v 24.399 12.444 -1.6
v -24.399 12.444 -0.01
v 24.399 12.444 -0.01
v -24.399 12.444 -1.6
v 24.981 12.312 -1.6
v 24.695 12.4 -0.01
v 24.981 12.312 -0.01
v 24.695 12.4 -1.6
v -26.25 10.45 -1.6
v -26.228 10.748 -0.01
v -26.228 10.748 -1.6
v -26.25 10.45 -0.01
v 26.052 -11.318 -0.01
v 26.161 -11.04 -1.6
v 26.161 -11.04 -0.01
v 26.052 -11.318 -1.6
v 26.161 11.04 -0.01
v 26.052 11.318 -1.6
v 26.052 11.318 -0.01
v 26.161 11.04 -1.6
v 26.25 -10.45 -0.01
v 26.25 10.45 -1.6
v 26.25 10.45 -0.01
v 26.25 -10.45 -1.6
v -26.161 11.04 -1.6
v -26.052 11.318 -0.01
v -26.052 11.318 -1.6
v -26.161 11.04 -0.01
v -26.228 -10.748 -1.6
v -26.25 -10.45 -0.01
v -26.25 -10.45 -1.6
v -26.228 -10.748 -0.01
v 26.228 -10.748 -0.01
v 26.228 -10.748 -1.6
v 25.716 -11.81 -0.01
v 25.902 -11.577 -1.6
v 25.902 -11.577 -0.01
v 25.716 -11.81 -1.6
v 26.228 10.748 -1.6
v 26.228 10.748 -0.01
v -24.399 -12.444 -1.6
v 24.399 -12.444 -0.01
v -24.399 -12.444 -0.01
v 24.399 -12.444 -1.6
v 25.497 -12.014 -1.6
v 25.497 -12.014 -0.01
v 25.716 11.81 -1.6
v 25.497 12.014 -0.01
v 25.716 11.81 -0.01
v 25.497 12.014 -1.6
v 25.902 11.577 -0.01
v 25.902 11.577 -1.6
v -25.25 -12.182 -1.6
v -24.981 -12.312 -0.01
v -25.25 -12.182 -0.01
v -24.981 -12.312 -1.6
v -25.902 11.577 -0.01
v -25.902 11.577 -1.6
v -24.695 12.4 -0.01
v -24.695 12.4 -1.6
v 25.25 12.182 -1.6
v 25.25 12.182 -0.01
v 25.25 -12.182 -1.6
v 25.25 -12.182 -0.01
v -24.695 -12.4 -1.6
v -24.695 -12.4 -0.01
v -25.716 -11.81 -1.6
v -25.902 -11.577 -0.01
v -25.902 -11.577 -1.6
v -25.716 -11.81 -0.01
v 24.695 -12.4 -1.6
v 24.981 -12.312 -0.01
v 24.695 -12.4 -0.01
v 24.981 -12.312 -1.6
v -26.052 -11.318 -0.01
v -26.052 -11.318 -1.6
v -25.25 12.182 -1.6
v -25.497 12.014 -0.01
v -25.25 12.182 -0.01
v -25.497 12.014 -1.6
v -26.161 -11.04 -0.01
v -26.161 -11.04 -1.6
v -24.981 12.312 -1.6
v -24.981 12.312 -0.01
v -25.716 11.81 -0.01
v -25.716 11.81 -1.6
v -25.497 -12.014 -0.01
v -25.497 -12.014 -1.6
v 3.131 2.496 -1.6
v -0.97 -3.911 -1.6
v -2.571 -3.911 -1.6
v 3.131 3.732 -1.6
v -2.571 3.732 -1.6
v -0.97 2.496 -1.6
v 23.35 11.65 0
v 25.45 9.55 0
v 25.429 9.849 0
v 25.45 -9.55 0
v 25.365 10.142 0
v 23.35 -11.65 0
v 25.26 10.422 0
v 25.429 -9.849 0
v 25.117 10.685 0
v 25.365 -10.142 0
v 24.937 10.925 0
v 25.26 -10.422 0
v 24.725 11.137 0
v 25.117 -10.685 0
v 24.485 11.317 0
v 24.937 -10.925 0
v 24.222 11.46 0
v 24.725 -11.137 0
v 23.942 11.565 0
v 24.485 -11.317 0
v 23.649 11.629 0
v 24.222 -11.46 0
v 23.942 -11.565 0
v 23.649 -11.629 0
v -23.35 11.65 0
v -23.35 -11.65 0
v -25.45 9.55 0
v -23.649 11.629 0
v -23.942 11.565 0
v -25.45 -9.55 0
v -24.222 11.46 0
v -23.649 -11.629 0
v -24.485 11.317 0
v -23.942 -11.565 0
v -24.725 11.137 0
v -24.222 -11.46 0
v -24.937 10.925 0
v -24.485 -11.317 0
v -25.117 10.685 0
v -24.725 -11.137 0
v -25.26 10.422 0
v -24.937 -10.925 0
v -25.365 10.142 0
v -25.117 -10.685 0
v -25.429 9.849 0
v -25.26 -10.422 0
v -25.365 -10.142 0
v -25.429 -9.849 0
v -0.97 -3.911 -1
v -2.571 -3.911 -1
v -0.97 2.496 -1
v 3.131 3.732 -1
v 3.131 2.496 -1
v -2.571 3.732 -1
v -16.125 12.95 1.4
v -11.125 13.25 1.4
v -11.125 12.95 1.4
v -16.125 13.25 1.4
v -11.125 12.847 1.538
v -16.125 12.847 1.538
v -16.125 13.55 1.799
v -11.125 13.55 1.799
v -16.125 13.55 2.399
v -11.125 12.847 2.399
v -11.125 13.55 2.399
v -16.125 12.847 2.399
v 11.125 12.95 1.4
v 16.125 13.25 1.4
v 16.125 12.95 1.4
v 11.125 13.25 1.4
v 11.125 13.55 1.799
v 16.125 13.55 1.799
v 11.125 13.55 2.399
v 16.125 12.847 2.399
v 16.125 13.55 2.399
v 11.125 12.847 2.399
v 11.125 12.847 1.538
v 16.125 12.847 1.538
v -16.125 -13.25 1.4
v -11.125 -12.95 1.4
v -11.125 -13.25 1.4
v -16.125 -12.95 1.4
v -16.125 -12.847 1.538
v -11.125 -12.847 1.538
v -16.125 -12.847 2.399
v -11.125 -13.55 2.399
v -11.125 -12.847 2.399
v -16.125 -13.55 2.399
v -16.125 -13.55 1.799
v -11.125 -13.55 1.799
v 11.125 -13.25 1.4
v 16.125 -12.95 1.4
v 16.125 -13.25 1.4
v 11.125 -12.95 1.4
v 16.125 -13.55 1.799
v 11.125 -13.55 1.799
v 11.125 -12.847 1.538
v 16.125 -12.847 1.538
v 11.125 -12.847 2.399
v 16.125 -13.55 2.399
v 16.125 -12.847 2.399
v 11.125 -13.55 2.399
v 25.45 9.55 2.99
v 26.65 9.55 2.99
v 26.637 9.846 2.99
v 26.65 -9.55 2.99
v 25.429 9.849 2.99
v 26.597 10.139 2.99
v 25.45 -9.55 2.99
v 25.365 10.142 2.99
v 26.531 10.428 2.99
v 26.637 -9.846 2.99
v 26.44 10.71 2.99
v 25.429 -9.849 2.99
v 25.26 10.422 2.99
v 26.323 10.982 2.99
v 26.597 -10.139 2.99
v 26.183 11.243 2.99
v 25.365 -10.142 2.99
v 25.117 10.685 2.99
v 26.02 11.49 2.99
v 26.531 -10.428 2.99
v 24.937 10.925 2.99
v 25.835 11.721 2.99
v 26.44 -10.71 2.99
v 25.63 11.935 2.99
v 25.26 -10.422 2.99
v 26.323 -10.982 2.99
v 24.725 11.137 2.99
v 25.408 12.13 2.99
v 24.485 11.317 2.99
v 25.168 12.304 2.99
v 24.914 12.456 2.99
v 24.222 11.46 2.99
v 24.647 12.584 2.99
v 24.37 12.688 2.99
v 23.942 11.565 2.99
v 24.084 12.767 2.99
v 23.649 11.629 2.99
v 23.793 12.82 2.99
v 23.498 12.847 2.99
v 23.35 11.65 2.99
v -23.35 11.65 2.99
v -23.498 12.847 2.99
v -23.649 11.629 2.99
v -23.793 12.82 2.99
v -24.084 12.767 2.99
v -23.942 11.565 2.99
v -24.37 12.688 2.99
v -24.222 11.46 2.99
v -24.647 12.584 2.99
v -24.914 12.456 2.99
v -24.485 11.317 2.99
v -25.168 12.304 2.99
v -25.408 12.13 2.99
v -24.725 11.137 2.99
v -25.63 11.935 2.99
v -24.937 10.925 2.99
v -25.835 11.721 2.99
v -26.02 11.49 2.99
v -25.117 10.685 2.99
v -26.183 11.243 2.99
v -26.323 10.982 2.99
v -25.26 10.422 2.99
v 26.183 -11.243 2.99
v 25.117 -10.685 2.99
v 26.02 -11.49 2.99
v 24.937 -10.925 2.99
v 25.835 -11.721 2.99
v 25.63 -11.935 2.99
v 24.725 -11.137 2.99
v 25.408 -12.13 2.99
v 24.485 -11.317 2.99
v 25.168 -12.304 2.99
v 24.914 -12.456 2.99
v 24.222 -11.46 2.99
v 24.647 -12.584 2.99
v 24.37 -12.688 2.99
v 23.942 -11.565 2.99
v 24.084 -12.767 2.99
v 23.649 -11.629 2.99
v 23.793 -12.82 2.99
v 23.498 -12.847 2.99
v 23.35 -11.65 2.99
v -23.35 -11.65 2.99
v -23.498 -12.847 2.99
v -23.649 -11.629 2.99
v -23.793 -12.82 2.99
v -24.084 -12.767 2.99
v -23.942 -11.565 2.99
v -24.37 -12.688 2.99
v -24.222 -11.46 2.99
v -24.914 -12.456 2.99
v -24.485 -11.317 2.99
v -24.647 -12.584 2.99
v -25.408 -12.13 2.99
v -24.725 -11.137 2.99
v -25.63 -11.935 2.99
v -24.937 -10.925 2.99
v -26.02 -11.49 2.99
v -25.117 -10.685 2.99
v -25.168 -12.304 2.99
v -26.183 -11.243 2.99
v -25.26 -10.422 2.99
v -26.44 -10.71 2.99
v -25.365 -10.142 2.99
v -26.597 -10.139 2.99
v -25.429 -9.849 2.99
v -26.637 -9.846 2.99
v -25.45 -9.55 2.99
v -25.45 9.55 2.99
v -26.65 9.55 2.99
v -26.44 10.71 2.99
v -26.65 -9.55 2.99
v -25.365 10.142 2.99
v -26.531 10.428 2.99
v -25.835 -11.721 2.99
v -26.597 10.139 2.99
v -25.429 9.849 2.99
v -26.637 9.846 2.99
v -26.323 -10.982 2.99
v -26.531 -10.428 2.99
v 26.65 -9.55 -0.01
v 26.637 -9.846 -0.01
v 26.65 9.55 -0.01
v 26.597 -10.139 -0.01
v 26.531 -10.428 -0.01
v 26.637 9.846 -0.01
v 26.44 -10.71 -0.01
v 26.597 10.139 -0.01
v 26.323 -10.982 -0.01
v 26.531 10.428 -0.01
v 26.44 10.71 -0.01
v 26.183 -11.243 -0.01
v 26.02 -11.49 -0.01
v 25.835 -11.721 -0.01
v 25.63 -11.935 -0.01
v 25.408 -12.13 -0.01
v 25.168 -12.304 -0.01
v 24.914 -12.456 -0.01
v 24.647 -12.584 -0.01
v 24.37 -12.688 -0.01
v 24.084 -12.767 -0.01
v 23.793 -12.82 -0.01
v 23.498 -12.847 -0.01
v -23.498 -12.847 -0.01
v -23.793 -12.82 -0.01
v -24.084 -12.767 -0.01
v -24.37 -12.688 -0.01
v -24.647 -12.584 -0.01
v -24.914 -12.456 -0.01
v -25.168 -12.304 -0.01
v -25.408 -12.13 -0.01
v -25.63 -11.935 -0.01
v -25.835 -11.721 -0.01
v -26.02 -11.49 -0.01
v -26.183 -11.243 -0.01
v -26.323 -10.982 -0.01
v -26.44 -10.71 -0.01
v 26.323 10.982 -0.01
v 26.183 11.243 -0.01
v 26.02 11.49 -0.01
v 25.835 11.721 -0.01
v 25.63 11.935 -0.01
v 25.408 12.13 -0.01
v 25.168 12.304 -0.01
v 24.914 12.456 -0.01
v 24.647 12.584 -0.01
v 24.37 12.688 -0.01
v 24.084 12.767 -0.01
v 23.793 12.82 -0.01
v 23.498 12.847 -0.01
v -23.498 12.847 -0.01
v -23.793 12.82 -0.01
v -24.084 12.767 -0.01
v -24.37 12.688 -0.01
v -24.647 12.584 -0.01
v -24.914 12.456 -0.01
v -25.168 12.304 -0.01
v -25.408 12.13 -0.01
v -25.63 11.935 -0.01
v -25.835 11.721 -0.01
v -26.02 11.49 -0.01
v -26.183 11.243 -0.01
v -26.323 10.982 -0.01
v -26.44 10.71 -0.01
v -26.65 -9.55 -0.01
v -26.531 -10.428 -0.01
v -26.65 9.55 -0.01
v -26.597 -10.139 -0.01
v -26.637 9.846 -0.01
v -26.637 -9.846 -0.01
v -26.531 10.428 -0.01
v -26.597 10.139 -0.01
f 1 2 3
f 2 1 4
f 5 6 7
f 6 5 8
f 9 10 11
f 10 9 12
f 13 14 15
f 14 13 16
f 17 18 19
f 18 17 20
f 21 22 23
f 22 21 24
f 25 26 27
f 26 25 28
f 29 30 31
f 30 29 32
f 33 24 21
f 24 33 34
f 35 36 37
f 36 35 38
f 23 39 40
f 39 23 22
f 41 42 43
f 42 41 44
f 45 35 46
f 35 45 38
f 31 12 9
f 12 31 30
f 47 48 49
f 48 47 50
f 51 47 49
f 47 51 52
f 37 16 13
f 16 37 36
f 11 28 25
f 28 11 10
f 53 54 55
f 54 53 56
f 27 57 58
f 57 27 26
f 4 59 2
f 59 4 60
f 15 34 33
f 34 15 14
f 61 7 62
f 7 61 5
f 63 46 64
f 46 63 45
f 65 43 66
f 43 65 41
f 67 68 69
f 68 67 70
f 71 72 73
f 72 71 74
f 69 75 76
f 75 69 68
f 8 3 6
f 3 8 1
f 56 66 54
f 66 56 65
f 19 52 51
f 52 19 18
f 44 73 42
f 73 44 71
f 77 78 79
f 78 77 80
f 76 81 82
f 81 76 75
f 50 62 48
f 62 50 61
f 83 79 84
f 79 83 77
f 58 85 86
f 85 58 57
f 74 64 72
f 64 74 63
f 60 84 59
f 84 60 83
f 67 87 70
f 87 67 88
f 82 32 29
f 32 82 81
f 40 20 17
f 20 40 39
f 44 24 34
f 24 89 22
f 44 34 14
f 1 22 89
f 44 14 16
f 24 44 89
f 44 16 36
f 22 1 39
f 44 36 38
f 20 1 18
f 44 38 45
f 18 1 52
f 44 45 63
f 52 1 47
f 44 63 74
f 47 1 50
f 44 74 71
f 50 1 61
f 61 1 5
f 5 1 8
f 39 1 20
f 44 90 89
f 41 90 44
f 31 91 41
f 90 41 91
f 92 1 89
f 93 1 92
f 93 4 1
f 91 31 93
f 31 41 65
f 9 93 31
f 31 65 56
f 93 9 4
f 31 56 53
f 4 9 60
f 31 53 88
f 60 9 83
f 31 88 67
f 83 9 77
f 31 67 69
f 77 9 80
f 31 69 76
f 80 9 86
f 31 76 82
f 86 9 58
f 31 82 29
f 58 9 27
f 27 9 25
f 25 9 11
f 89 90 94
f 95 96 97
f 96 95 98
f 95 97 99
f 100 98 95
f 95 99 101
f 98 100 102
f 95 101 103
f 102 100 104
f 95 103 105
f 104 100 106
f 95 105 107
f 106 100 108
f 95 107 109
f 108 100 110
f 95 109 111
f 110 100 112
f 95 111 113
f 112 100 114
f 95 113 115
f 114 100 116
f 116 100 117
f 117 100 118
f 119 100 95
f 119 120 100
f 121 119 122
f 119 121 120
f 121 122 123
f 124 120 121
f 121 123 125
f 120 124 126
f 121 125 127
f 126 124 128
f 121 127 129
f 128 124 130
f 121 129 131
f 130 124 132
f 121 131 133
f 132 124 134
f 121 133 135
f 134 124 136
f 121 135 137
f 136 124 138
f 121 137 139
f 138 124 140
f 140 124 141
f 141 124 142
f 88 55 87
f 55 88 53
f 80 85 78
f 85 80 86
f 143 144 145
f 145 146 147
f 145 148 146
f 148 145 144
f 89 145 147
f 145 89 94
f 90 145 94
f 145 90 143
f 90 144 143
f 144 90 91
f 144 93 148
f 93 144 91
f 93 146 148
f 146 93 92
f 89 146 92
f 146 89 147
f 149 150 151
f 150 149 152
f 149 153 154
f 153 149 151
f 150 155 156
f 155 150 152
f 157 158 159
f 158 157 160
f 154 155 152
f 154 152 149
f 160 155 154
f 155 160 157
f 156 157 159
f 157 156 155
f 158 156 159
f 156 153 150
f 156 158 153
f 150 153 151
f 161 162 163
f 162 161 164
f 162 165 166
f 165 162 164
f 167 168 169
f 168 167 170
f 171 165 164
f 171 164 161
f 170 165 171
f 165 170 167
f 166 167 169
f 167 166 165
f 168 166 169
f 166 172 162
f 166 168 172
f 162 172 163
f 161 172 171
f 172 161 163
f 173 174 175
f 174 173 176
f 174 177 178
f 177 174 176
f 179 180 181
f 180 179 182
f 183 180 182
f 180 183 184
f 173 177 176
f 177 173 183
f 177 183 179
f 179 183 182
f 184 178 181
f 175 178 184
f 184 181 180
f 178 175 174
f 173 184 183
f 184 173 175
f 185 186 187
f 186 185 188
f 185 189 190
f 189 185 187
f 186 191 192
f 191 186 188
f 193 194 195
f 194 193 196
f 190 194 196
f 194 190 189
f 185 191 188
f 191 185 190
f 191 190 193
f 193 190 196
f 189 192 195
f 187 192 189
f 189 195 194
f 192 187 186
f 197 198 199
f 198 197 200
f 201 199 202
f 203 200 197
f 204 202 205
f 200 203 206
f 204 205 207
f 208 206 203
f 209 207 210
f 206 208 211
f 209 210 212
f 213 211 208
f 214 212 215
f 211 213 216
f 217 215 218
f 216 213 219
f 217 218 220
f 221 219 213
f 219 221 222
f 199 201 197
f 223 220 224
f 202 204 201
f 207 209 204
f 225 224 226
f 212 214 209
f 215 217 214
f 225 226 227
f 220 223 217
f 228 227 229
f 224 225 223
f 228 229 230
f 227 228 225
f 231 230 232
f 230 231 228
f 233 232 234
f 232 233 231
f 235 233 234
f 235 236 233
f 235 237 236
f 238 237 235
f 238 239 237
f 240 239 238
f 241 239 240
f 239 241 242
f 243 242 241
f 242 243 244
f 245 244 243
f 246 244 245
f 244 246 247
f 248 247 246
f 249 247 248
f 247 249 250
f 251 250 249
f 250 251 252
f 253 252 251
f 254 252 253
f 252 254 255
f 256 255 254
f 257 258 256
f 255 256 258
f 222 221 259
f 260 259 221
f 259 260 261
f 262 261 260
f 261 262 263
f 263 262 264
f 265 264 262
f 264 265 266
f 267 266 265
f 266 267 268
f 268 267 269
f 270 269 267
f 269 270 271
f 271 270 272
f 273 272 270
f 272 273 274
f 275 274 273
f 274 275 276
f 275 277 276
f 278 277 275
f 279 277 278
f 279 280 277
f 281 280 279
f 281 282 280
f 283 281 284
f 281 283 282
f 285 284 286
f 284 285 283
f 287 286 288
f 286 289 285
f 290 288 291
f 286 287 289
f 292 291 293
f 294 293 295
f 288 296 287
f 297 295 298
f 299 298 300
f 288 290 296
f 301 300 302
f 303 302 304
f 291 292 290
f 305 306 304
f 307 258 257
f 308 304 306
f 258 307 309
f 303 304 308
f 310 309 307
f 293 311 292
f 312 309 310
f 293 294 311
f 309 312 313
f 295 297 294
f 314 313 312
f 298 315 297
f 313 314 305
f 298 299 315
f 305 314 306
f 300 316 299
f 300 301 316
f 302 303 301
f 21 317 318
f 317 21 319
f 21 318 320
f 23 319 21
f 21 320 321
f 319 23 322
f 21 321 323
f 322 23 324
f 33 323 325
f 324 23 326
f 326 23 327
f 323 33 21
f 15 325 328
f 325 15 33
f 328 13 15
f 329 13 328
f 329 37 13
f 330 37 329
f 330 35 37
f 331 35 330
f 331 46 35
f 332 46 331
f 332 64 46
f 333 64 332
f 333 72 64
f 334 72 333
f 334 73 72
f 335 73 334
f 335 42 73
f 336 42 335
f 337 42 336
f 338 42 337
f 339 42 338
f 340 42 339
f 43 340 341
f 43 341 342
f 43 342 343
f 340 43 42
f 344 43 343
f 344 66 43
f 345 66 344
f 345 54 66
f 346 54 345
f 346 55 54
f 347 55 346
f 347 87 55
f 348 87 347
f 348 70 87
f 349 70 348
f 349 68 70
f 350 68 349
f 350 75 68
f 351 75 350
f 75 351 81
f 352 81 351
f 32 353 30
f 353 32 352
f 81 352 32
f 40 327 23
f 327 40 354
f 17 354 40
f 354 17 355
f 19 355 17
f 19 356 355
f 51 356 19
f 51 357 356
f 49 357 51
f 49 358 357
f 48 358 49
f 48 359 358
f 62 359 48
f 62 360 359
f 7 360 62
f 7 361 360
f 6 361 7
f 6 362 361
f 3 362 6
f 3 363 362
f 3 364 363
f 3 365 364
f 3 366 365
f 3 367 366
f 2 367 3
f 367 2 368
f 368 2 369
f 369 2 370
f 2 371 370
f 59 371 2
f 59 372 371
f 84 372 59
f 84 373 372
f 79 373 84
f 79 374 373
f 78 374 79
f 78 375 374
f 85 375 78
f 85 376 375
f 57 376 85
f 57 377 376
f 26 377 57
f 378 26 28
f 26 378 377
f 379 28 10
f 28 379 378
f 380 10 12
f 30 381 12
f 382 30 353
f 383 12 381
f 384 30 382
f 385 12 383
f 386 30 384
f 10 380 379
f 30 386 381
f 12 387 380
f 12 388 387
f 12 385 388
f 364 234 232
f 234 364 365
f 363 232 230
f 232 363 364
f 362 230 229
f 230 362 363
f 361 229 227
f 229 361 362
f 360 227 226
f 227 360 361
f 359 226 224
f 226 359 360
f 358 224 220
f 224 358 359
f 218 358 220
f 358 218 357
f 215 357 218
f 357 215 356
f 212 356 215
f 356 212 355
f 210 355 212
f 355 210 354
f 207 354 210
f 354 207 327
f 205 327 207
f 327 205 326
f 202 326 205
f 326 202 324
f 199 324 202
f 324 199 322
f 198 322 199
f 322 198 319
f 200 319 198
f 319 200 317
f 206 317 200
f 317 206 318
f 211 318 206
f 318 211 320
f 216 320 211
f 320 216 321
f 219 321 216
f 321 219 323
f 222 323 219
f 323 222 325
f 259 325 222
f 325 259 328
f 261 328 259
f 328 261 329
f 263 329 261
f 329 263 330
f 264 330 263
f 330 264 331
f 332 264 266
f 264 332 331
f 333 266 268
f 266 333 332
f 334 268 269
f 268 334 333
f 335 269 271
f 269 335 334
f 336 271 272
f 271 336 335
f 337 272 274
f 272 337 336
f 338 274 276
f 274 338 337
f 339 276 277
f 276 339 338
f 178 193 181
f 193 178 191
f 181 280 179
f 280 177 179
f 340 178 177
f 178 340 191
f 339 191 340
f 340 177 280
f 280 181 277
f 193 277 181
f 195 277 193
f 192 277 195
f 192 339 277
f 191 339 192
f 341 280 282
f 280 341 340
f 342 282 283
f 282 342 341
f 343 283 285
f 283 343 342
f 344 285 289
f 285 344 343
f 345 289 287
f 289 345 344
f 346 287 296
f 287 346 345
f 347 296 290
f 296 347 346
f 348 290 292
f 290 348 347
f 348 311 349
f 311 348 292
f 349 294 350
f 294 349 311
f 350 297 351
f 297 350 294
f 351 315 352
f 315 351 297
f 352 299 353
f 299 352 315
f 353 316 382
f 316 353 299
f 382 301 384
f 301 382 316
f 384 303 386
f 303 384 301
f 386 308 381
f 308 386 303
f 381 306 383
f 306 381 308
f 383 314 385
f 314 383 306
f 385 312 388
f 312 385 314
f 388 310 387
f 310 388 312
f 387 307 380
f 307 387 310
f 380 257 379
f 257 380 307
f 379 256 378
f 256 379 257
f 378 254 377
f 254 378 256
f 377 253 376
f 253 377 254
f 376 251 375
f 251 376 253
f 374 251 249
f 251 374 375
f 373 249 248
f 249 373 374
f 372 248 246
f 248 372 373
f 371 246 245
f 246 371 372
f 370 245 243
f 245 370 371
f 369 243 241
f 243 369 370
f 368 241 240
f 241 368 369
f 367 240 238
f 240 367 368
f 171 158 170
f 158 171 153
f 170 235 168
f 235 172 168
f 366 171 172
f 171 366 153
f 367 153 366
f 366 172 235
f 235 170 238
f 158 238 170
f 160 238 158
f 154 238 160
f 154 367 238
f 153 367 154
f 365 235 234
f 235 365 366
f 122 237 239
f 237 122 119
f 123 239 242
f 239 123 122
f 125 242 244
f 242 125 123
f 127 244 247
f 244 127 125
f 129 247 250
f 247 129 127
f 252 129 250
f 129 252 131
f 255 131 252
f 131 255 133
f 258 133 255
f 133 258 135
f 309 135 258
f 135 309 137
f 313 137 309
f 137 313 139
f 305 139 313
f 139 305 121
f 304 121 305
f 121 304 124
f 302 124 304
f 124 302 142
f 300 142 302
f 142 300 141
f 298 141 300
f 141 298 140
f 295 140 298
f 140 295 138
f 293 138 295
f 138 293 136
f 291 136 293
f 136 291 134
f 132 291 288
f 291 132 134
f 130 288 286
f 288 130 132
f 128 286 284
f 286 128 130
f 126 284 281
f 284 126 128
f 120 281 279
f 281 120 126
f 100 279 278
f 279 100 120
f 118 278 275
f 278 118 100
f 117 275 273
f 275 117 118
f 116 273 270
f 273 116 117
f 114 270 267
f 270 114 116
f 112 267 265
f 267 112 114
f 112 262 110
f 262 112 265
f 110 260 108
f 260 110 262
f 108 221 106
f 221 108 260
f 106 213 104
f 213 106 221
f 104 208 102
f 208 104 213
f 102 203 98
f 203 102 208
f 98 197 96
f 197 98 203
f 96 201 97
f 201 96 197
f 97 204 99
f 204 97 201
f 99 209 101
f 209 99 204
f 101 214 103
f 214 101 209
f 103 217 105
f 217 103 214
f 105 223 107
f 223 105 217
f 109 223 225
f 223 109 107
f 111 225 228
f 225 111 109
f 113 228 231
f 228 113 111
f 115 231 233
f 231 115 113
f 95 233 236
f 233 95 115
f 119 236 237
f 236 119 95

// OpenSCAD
// ============================================================================
//  AI Sport Monitor — Carcasa wearable v5 (caja vacia)
//
//  ALCANCE DE ESTA VERSION:
//      Solo BASE rectangular hueca + TAPA snap-fit. Interior completamente
//      vacio: sin separaciones, sin postes, sin guias para componentes.
//
//  CAMBIO IMPORTANTE EN ESTA REVISION:
//      Cierre rediseñado con sistema TETONES + RANURAS:
//        - Labio mas grueso (1.2 mm) para mas resistencia
//        - Tolerancia mas ajustada (0.15 mm) para encaje preciso
//        - 4 tetones rectangulares en el labio que encajan en 4 ranuras
//          en la pared del rebaje del cuerpo, produciendo un CLIC firme
//        - Las dimensiones de tetones y ranuras estan asimetricas con
//          interferencia controlada para garantizar el snap.
//
//  Lenguaje formal:
//      - Caja rectangular con esquinas redondeadas (R = 3 mm)
//      - Chaflanes superior e inferior de 0.8 mm
//      - Marca L / R grabada en la tapa
//
//  Convenciones:
//      Eje X = largo
//      Eje Y = ancho
//      Eje Z = alto
// ============================================================================

// ----------------------------------------------------------------------------
//  PARAMETROS
// ----------------------------------------------------------------------------

PART = "lid";   // "body", "lid", "both", "exploded"

TOL       = 0.15;    // tolerancia general (antes 0.30, ahora encaje justo)
WALL      = 1.8;
FLOOR     = 1.6;
LID_TOP   = 1.6;
LID_LIP_H = 3.0;     // labio mas alto (antes 2.5) para mas guiado
LID_LIP_T = 1.2;     // labio mas grueso (antes 1.0) para resistir el snap

CORNER_R  = 3.0;
CHAMFER   = 0.8;

NODE_LABEL = "L";    // "L" o "R"

// --- Parametros del sistema snap (tetones + ranuras) ---
DETENT_W   = 5.0;    // largo del teton (en X) en los lados largos
DETENT_H   = 1.0;    // alto del teton en Z
DETENT_P   = 0.5;    // protrusion del teton hacia fuera del labio (interferencia
                     // con la pared del rebaje — esto es lo que da el "clic")
DETENT_Z_FROM_BOTTOM_OF_LIP = 0.6;  // distancia desde la cara inferior del
                                     // labio al borde inferior del teton

// --- Parametros del agujero USB-C (lado +X, pegado al piso) ---
USBC_W     = 9.0;    // ancho real del conector USB-C del XIAO
USBC_H     = 3.5;    // alto real del conector USB-C del XIAO
USBC_TOL   = 0.4;    // holgura extra para acceso frecuente con cable
USBC_Z_C   = FLOOR + USBC_H/2 + 1.4;  // centro Z del agujero ~ 3 mm desde piso ext
                                       // (pegado al piso, deja sitio para PCB)

$fa = 2;
$fs = 0.3;

// ----------------------------------------------------------------------------
//  DIMENSIONES INTERIORES
// ----------------------------------------------------------------------------

INNER_X = 50.9;
INNER_Y = 23.3;
INNER_Z = 14.0;

BODY_X = INNER_X + 2 * WALL;     // 54.5
BODY_Y = INNER_Y + 2 * WALL;     // 26.9
BODY_Z = FLOOR + INNER_Z;        // 15.6

// ----------------------------------------------------------------------------
//  PRIMITIVAS
// ----------------------------------------------------------------------------

module rounded_rect(x, y, r) {
    hull() {
        for (sx = [-1, 1], sy = [-1, 1])
            translate([sx*(x/2 - r), sy*(y/2 - r), 0])
                circle(r = r);
    }
}

module whoop_box(x, y, z, r, ch) {
    hull() {
        translate([0, 0, 0])
            linear_extrude(height = 0.01)
                rounded_rect(x - 2*ch, y - 2*ch, max(0.5, r - ch));
        translate([0, 0, ch])
            linear_extrude(height = z - 2*ch)
                rounded_rect(x, y, r);
        translate([0, 0, z - 0.01])
            linear_extrude(height = 0.01)
                rounded_rect(x - 2*ch, y - 2*ch, max(0.5, r - ch));
    }
}

// ----------------------------------------------------------------------------
//  POSICIONES DE LOS 4 TETONES (en los lados LARGOS del labio)
//  2 tetones por lado largo (lado +Y y lado -Y), espaciados en X.
// ----------------------------------------------------------------------------
DETENT_X_OFFSETS = [-BODY_X/4, BODY_X/4];

// Y del centro del teton (sobre la cara exterior del labio en el lado largo).
// El labio exterior llega hasta Y = ±(INNER_Y/2 + LID_LIP_T)
DETENT_Y = INNER_Y/2 + LID_LIP_T;

// ----------------------------------------------------------------------------
//  CUERPO  (caja hueca + ranuras receptoras de los tetones)
// ----------------------------------------------------------------------------

module body() {
    difference() {
        whoop_box(BODY_X, BODY_Y, BODY_Z, CORNER_R, CHAMFER);

        // Vaciado interior (caja completamente vacia)
        translate([0, 0, FLOOR])
            linear_extrude(height = INNER_Z + LID_LIP_H + 1)
                rounded_rect(INNER_X, INNER_Y, max(1.0, CORNER_R - WALL/2));

        // Rebaje perimetral para el labio de la tapa
        // Notese: el rebaje es 0.15 mm mas ancho que el labio (TOL),
        // muy poco — esto fuerza un encaje justo.
        translate([0, 0, BODY_Z - LID_LIP_H])
            linear_extrude(height = LID_LIP_H + 0.1)
                difference() {
                    rounded_rect(INNER_X + 2*LID_LIP_T + 2*TOL,
                                 INNER_Y + 2*LID_LIP_T + 2*TOL,
                                 max(0.8, CORNER_R - WALL/2 + LID_LIP_T));
                    rounded_rect(INNER_X, INNER_Y,
                                 max(1.0, CORNER_R - WALL/2));
                }

        // ---------- RANURAS para los 4 tetones ----------
        // Cada ranura es un pequeño bolsillo en la pared del rebaje
        // (en los lados largos +Y / -Y) donde encaja el teton de la tapa.
        // Z del centro de la ranura: medido desde el fondo del rebaje
        // (Z = BODY_Z - LID_LIP_H) hacia arriba.
        detent_z_center = BODY_Z - LID_LIP_H + DETENT_Z_FROM_BOTTOM_OF_LIP + DETENT_H/2;

        for (sy = [-1, 1])
            for (xpos = DETENT_X_OFFSETS)
                translate([xpos,
                           sy * (DETENT_Y + DETENT_P/2),  // dentro de la pared
                           detent_z_center])
                    cube([DETENT_W,
                          DETENT_P + 0.4,   // profundidad ligera
                          DETENT_H + 0.2],  // un pelin mas alta para tolerancia
                         center = true);

        // ---------- Pestana de apertura de la tapa ----------
        // Pequeño rebaje en uno de los lados largos para meter la uña
        // y hacer palanca al abrir.
        translate([0, BODY_Y/2 - 0.5, BODY_Z - LID_LIP_H/2])
            cube([10, 2, LID_LIP_H + 0.6], center = true);

        // ---------- Agujero USB-C (pared +X, pegado al piso) ----------
        // Atraviesa la pared corta del lado +X. El cubo arranca un par
        // de mm hacia dentro de la pared para garantizar corte limpio
        // y se extiende ~4 mm hacia fuera (depth = WALL + 4).
        translate([BODY_X/2 - WALL - 1, 0, USBC_Z_C])
            cube([WALL + 4,
                  USBC_W + USBC_TOL,
                  USBC_H + USBC_TOL],
                 center = true);
    }
}

// ----------------------------------------------------------------------------
//  TAPA  (con tetones que encajan en las ranuras del cuerpo)
// ----------------------------------------------------------------------------

module lid() {
    union() {
        difference() {
            whoop_box(BODY_X - 0.4, BODY_Y - 0.4, LID_TOP, CORNER_R - 0.2, CHAMFER);

            // Grabado del label centrado
            translate([0, 0, LID_TOP - 0.6])
                linear_extrude(height = 0.8)
                    text(NODE_LABEL, size = 8, halign = "center",
                         valign = "center",
                         font = "Liberation Sans:style=Bold");
        }

        // ---------- Labio perimetral ----------
        // Macizo: rectangulo de paredes de LID_LIP_T mm de grosor,
        // que encaja en el rebaje del cuerpo.
        translate([0, 0, -LID_LIP_H + 0.01])
            linear_extrude(height = LID_LIP_H)
                difference() {
                    rounded_rect(INNER_X + 2*LID_LIP_T,
                                 INNER_Y + 2*LID_LIP_T,
                                 max(0.8, CORNER_R - WALL/2 + LID_LIP_T));
                    rounded_rect(INNER_X,
                                 INNER_Y,
                                 max(1.0, CORNER_R - WALL/2));
                }

        // ---------- 4 tetones rectangulares en lados largos ----------
        // Sobresalen DETENT_P (0.5 mm) hacia fuera de la pared del labio.
        // Esa interferencia con la pared del rebaje es la que produce el
        // CLIC al cerrar y la fuerza de retencion al estar puesto.
        // El borde superior del teton tiene un chaflan ligero de entrada
        // para que la tapa "monte" facil al cerrar.
        detent_z_center = -LID_LIP_H + DETENT_Z_FROM_BOTTOM_OF_LIP + DETENT_H/2;

        for (sy = [-1, 1])
            for (xpos = DETENT_X_OFFSETS)
                translate([xpos,
                           sy * (DETENT_Y + DETENT_P/2),
                           detent_z_center])
                    detent_block();
    }
}

// Bloque de teton con chaflan superior (rampa de entrada)
//   Ejes locales: X = largo del teton, Y = profundidad (protrusion),
//                 Z = altura del teton, centrado en origen.
module detent_block() {
    hull() {
        // base inferior (la cara que mira al fondo del rebaje) — completa
        translate([0, 0, -DETENT_H/2 + 0.001])
            cube([DETENT_W, DETENT_P + 0.4, 0.001], center = true);
        // cintura (cara plana que hace tope contra la ranura)
        translate([0, 0, -DETENT_H/2 + DETENT_H * 0.6])
            cube([DETENT_W, DETENT_P + 0.4, 0.001], center = true);
        // cara superior reducida en Y => crea rampa de entrada
        // (chaflan que ayuda a montar la tapa)
        translate([0, 0, DETENT_H/2 - 0.001])
            cube([DETENT_W, 0.3, 0.001], center = true);
    }
}

// ----------------------------------------------------------------------------
//  VISTA EXPLODED
// ----------------------------------------------------------------------------

module exploded_view() {
    body();
    translate([0, 0, BODY_Z + 15])
        lid();
}

// ----------------------------------------------------------------------------
//  RENDER
// ----------------------------------------------------------------------------

if (PART == "body") {
    body();
} else if (PART == "lid") {
    rotate([180, 0, 0]) lid();
} else if (PART == "both") {
    body();
    translate([0, BODY_Y + 15, 0])
        rotate([180, 0, 0])
            lid();
} else if (PART == "exploded") {
    exploded_view();
}

// ----------------------------------------------------------------------------
//  ECHO
// ----------------------------------------------------------------------------
echo(str("BODY  X=", BODY_X, "  Y=", BODY_Y, "  Z=", BODY_Z, "  mm"));
echo(str("INNER X=", INNER_X, "  Y=", INNER_Y, "  Z=", INNER_Z));
echo(str("Snap: tetones de ", DETENT_W, "x", DETENT_H,
        " mm con interferencia ", DETENT_P, " mm"));
echo(str("Tolerancia labio/rebaje: ", TOL, " mm"));
echo(str("USB-C cutout: ", USBC_W + USBC_TOL, " x ", USBC_H + USBC_TOL,
        " mm  (lado +X, centro Z=", USBC_Z_C, " mm)"));
